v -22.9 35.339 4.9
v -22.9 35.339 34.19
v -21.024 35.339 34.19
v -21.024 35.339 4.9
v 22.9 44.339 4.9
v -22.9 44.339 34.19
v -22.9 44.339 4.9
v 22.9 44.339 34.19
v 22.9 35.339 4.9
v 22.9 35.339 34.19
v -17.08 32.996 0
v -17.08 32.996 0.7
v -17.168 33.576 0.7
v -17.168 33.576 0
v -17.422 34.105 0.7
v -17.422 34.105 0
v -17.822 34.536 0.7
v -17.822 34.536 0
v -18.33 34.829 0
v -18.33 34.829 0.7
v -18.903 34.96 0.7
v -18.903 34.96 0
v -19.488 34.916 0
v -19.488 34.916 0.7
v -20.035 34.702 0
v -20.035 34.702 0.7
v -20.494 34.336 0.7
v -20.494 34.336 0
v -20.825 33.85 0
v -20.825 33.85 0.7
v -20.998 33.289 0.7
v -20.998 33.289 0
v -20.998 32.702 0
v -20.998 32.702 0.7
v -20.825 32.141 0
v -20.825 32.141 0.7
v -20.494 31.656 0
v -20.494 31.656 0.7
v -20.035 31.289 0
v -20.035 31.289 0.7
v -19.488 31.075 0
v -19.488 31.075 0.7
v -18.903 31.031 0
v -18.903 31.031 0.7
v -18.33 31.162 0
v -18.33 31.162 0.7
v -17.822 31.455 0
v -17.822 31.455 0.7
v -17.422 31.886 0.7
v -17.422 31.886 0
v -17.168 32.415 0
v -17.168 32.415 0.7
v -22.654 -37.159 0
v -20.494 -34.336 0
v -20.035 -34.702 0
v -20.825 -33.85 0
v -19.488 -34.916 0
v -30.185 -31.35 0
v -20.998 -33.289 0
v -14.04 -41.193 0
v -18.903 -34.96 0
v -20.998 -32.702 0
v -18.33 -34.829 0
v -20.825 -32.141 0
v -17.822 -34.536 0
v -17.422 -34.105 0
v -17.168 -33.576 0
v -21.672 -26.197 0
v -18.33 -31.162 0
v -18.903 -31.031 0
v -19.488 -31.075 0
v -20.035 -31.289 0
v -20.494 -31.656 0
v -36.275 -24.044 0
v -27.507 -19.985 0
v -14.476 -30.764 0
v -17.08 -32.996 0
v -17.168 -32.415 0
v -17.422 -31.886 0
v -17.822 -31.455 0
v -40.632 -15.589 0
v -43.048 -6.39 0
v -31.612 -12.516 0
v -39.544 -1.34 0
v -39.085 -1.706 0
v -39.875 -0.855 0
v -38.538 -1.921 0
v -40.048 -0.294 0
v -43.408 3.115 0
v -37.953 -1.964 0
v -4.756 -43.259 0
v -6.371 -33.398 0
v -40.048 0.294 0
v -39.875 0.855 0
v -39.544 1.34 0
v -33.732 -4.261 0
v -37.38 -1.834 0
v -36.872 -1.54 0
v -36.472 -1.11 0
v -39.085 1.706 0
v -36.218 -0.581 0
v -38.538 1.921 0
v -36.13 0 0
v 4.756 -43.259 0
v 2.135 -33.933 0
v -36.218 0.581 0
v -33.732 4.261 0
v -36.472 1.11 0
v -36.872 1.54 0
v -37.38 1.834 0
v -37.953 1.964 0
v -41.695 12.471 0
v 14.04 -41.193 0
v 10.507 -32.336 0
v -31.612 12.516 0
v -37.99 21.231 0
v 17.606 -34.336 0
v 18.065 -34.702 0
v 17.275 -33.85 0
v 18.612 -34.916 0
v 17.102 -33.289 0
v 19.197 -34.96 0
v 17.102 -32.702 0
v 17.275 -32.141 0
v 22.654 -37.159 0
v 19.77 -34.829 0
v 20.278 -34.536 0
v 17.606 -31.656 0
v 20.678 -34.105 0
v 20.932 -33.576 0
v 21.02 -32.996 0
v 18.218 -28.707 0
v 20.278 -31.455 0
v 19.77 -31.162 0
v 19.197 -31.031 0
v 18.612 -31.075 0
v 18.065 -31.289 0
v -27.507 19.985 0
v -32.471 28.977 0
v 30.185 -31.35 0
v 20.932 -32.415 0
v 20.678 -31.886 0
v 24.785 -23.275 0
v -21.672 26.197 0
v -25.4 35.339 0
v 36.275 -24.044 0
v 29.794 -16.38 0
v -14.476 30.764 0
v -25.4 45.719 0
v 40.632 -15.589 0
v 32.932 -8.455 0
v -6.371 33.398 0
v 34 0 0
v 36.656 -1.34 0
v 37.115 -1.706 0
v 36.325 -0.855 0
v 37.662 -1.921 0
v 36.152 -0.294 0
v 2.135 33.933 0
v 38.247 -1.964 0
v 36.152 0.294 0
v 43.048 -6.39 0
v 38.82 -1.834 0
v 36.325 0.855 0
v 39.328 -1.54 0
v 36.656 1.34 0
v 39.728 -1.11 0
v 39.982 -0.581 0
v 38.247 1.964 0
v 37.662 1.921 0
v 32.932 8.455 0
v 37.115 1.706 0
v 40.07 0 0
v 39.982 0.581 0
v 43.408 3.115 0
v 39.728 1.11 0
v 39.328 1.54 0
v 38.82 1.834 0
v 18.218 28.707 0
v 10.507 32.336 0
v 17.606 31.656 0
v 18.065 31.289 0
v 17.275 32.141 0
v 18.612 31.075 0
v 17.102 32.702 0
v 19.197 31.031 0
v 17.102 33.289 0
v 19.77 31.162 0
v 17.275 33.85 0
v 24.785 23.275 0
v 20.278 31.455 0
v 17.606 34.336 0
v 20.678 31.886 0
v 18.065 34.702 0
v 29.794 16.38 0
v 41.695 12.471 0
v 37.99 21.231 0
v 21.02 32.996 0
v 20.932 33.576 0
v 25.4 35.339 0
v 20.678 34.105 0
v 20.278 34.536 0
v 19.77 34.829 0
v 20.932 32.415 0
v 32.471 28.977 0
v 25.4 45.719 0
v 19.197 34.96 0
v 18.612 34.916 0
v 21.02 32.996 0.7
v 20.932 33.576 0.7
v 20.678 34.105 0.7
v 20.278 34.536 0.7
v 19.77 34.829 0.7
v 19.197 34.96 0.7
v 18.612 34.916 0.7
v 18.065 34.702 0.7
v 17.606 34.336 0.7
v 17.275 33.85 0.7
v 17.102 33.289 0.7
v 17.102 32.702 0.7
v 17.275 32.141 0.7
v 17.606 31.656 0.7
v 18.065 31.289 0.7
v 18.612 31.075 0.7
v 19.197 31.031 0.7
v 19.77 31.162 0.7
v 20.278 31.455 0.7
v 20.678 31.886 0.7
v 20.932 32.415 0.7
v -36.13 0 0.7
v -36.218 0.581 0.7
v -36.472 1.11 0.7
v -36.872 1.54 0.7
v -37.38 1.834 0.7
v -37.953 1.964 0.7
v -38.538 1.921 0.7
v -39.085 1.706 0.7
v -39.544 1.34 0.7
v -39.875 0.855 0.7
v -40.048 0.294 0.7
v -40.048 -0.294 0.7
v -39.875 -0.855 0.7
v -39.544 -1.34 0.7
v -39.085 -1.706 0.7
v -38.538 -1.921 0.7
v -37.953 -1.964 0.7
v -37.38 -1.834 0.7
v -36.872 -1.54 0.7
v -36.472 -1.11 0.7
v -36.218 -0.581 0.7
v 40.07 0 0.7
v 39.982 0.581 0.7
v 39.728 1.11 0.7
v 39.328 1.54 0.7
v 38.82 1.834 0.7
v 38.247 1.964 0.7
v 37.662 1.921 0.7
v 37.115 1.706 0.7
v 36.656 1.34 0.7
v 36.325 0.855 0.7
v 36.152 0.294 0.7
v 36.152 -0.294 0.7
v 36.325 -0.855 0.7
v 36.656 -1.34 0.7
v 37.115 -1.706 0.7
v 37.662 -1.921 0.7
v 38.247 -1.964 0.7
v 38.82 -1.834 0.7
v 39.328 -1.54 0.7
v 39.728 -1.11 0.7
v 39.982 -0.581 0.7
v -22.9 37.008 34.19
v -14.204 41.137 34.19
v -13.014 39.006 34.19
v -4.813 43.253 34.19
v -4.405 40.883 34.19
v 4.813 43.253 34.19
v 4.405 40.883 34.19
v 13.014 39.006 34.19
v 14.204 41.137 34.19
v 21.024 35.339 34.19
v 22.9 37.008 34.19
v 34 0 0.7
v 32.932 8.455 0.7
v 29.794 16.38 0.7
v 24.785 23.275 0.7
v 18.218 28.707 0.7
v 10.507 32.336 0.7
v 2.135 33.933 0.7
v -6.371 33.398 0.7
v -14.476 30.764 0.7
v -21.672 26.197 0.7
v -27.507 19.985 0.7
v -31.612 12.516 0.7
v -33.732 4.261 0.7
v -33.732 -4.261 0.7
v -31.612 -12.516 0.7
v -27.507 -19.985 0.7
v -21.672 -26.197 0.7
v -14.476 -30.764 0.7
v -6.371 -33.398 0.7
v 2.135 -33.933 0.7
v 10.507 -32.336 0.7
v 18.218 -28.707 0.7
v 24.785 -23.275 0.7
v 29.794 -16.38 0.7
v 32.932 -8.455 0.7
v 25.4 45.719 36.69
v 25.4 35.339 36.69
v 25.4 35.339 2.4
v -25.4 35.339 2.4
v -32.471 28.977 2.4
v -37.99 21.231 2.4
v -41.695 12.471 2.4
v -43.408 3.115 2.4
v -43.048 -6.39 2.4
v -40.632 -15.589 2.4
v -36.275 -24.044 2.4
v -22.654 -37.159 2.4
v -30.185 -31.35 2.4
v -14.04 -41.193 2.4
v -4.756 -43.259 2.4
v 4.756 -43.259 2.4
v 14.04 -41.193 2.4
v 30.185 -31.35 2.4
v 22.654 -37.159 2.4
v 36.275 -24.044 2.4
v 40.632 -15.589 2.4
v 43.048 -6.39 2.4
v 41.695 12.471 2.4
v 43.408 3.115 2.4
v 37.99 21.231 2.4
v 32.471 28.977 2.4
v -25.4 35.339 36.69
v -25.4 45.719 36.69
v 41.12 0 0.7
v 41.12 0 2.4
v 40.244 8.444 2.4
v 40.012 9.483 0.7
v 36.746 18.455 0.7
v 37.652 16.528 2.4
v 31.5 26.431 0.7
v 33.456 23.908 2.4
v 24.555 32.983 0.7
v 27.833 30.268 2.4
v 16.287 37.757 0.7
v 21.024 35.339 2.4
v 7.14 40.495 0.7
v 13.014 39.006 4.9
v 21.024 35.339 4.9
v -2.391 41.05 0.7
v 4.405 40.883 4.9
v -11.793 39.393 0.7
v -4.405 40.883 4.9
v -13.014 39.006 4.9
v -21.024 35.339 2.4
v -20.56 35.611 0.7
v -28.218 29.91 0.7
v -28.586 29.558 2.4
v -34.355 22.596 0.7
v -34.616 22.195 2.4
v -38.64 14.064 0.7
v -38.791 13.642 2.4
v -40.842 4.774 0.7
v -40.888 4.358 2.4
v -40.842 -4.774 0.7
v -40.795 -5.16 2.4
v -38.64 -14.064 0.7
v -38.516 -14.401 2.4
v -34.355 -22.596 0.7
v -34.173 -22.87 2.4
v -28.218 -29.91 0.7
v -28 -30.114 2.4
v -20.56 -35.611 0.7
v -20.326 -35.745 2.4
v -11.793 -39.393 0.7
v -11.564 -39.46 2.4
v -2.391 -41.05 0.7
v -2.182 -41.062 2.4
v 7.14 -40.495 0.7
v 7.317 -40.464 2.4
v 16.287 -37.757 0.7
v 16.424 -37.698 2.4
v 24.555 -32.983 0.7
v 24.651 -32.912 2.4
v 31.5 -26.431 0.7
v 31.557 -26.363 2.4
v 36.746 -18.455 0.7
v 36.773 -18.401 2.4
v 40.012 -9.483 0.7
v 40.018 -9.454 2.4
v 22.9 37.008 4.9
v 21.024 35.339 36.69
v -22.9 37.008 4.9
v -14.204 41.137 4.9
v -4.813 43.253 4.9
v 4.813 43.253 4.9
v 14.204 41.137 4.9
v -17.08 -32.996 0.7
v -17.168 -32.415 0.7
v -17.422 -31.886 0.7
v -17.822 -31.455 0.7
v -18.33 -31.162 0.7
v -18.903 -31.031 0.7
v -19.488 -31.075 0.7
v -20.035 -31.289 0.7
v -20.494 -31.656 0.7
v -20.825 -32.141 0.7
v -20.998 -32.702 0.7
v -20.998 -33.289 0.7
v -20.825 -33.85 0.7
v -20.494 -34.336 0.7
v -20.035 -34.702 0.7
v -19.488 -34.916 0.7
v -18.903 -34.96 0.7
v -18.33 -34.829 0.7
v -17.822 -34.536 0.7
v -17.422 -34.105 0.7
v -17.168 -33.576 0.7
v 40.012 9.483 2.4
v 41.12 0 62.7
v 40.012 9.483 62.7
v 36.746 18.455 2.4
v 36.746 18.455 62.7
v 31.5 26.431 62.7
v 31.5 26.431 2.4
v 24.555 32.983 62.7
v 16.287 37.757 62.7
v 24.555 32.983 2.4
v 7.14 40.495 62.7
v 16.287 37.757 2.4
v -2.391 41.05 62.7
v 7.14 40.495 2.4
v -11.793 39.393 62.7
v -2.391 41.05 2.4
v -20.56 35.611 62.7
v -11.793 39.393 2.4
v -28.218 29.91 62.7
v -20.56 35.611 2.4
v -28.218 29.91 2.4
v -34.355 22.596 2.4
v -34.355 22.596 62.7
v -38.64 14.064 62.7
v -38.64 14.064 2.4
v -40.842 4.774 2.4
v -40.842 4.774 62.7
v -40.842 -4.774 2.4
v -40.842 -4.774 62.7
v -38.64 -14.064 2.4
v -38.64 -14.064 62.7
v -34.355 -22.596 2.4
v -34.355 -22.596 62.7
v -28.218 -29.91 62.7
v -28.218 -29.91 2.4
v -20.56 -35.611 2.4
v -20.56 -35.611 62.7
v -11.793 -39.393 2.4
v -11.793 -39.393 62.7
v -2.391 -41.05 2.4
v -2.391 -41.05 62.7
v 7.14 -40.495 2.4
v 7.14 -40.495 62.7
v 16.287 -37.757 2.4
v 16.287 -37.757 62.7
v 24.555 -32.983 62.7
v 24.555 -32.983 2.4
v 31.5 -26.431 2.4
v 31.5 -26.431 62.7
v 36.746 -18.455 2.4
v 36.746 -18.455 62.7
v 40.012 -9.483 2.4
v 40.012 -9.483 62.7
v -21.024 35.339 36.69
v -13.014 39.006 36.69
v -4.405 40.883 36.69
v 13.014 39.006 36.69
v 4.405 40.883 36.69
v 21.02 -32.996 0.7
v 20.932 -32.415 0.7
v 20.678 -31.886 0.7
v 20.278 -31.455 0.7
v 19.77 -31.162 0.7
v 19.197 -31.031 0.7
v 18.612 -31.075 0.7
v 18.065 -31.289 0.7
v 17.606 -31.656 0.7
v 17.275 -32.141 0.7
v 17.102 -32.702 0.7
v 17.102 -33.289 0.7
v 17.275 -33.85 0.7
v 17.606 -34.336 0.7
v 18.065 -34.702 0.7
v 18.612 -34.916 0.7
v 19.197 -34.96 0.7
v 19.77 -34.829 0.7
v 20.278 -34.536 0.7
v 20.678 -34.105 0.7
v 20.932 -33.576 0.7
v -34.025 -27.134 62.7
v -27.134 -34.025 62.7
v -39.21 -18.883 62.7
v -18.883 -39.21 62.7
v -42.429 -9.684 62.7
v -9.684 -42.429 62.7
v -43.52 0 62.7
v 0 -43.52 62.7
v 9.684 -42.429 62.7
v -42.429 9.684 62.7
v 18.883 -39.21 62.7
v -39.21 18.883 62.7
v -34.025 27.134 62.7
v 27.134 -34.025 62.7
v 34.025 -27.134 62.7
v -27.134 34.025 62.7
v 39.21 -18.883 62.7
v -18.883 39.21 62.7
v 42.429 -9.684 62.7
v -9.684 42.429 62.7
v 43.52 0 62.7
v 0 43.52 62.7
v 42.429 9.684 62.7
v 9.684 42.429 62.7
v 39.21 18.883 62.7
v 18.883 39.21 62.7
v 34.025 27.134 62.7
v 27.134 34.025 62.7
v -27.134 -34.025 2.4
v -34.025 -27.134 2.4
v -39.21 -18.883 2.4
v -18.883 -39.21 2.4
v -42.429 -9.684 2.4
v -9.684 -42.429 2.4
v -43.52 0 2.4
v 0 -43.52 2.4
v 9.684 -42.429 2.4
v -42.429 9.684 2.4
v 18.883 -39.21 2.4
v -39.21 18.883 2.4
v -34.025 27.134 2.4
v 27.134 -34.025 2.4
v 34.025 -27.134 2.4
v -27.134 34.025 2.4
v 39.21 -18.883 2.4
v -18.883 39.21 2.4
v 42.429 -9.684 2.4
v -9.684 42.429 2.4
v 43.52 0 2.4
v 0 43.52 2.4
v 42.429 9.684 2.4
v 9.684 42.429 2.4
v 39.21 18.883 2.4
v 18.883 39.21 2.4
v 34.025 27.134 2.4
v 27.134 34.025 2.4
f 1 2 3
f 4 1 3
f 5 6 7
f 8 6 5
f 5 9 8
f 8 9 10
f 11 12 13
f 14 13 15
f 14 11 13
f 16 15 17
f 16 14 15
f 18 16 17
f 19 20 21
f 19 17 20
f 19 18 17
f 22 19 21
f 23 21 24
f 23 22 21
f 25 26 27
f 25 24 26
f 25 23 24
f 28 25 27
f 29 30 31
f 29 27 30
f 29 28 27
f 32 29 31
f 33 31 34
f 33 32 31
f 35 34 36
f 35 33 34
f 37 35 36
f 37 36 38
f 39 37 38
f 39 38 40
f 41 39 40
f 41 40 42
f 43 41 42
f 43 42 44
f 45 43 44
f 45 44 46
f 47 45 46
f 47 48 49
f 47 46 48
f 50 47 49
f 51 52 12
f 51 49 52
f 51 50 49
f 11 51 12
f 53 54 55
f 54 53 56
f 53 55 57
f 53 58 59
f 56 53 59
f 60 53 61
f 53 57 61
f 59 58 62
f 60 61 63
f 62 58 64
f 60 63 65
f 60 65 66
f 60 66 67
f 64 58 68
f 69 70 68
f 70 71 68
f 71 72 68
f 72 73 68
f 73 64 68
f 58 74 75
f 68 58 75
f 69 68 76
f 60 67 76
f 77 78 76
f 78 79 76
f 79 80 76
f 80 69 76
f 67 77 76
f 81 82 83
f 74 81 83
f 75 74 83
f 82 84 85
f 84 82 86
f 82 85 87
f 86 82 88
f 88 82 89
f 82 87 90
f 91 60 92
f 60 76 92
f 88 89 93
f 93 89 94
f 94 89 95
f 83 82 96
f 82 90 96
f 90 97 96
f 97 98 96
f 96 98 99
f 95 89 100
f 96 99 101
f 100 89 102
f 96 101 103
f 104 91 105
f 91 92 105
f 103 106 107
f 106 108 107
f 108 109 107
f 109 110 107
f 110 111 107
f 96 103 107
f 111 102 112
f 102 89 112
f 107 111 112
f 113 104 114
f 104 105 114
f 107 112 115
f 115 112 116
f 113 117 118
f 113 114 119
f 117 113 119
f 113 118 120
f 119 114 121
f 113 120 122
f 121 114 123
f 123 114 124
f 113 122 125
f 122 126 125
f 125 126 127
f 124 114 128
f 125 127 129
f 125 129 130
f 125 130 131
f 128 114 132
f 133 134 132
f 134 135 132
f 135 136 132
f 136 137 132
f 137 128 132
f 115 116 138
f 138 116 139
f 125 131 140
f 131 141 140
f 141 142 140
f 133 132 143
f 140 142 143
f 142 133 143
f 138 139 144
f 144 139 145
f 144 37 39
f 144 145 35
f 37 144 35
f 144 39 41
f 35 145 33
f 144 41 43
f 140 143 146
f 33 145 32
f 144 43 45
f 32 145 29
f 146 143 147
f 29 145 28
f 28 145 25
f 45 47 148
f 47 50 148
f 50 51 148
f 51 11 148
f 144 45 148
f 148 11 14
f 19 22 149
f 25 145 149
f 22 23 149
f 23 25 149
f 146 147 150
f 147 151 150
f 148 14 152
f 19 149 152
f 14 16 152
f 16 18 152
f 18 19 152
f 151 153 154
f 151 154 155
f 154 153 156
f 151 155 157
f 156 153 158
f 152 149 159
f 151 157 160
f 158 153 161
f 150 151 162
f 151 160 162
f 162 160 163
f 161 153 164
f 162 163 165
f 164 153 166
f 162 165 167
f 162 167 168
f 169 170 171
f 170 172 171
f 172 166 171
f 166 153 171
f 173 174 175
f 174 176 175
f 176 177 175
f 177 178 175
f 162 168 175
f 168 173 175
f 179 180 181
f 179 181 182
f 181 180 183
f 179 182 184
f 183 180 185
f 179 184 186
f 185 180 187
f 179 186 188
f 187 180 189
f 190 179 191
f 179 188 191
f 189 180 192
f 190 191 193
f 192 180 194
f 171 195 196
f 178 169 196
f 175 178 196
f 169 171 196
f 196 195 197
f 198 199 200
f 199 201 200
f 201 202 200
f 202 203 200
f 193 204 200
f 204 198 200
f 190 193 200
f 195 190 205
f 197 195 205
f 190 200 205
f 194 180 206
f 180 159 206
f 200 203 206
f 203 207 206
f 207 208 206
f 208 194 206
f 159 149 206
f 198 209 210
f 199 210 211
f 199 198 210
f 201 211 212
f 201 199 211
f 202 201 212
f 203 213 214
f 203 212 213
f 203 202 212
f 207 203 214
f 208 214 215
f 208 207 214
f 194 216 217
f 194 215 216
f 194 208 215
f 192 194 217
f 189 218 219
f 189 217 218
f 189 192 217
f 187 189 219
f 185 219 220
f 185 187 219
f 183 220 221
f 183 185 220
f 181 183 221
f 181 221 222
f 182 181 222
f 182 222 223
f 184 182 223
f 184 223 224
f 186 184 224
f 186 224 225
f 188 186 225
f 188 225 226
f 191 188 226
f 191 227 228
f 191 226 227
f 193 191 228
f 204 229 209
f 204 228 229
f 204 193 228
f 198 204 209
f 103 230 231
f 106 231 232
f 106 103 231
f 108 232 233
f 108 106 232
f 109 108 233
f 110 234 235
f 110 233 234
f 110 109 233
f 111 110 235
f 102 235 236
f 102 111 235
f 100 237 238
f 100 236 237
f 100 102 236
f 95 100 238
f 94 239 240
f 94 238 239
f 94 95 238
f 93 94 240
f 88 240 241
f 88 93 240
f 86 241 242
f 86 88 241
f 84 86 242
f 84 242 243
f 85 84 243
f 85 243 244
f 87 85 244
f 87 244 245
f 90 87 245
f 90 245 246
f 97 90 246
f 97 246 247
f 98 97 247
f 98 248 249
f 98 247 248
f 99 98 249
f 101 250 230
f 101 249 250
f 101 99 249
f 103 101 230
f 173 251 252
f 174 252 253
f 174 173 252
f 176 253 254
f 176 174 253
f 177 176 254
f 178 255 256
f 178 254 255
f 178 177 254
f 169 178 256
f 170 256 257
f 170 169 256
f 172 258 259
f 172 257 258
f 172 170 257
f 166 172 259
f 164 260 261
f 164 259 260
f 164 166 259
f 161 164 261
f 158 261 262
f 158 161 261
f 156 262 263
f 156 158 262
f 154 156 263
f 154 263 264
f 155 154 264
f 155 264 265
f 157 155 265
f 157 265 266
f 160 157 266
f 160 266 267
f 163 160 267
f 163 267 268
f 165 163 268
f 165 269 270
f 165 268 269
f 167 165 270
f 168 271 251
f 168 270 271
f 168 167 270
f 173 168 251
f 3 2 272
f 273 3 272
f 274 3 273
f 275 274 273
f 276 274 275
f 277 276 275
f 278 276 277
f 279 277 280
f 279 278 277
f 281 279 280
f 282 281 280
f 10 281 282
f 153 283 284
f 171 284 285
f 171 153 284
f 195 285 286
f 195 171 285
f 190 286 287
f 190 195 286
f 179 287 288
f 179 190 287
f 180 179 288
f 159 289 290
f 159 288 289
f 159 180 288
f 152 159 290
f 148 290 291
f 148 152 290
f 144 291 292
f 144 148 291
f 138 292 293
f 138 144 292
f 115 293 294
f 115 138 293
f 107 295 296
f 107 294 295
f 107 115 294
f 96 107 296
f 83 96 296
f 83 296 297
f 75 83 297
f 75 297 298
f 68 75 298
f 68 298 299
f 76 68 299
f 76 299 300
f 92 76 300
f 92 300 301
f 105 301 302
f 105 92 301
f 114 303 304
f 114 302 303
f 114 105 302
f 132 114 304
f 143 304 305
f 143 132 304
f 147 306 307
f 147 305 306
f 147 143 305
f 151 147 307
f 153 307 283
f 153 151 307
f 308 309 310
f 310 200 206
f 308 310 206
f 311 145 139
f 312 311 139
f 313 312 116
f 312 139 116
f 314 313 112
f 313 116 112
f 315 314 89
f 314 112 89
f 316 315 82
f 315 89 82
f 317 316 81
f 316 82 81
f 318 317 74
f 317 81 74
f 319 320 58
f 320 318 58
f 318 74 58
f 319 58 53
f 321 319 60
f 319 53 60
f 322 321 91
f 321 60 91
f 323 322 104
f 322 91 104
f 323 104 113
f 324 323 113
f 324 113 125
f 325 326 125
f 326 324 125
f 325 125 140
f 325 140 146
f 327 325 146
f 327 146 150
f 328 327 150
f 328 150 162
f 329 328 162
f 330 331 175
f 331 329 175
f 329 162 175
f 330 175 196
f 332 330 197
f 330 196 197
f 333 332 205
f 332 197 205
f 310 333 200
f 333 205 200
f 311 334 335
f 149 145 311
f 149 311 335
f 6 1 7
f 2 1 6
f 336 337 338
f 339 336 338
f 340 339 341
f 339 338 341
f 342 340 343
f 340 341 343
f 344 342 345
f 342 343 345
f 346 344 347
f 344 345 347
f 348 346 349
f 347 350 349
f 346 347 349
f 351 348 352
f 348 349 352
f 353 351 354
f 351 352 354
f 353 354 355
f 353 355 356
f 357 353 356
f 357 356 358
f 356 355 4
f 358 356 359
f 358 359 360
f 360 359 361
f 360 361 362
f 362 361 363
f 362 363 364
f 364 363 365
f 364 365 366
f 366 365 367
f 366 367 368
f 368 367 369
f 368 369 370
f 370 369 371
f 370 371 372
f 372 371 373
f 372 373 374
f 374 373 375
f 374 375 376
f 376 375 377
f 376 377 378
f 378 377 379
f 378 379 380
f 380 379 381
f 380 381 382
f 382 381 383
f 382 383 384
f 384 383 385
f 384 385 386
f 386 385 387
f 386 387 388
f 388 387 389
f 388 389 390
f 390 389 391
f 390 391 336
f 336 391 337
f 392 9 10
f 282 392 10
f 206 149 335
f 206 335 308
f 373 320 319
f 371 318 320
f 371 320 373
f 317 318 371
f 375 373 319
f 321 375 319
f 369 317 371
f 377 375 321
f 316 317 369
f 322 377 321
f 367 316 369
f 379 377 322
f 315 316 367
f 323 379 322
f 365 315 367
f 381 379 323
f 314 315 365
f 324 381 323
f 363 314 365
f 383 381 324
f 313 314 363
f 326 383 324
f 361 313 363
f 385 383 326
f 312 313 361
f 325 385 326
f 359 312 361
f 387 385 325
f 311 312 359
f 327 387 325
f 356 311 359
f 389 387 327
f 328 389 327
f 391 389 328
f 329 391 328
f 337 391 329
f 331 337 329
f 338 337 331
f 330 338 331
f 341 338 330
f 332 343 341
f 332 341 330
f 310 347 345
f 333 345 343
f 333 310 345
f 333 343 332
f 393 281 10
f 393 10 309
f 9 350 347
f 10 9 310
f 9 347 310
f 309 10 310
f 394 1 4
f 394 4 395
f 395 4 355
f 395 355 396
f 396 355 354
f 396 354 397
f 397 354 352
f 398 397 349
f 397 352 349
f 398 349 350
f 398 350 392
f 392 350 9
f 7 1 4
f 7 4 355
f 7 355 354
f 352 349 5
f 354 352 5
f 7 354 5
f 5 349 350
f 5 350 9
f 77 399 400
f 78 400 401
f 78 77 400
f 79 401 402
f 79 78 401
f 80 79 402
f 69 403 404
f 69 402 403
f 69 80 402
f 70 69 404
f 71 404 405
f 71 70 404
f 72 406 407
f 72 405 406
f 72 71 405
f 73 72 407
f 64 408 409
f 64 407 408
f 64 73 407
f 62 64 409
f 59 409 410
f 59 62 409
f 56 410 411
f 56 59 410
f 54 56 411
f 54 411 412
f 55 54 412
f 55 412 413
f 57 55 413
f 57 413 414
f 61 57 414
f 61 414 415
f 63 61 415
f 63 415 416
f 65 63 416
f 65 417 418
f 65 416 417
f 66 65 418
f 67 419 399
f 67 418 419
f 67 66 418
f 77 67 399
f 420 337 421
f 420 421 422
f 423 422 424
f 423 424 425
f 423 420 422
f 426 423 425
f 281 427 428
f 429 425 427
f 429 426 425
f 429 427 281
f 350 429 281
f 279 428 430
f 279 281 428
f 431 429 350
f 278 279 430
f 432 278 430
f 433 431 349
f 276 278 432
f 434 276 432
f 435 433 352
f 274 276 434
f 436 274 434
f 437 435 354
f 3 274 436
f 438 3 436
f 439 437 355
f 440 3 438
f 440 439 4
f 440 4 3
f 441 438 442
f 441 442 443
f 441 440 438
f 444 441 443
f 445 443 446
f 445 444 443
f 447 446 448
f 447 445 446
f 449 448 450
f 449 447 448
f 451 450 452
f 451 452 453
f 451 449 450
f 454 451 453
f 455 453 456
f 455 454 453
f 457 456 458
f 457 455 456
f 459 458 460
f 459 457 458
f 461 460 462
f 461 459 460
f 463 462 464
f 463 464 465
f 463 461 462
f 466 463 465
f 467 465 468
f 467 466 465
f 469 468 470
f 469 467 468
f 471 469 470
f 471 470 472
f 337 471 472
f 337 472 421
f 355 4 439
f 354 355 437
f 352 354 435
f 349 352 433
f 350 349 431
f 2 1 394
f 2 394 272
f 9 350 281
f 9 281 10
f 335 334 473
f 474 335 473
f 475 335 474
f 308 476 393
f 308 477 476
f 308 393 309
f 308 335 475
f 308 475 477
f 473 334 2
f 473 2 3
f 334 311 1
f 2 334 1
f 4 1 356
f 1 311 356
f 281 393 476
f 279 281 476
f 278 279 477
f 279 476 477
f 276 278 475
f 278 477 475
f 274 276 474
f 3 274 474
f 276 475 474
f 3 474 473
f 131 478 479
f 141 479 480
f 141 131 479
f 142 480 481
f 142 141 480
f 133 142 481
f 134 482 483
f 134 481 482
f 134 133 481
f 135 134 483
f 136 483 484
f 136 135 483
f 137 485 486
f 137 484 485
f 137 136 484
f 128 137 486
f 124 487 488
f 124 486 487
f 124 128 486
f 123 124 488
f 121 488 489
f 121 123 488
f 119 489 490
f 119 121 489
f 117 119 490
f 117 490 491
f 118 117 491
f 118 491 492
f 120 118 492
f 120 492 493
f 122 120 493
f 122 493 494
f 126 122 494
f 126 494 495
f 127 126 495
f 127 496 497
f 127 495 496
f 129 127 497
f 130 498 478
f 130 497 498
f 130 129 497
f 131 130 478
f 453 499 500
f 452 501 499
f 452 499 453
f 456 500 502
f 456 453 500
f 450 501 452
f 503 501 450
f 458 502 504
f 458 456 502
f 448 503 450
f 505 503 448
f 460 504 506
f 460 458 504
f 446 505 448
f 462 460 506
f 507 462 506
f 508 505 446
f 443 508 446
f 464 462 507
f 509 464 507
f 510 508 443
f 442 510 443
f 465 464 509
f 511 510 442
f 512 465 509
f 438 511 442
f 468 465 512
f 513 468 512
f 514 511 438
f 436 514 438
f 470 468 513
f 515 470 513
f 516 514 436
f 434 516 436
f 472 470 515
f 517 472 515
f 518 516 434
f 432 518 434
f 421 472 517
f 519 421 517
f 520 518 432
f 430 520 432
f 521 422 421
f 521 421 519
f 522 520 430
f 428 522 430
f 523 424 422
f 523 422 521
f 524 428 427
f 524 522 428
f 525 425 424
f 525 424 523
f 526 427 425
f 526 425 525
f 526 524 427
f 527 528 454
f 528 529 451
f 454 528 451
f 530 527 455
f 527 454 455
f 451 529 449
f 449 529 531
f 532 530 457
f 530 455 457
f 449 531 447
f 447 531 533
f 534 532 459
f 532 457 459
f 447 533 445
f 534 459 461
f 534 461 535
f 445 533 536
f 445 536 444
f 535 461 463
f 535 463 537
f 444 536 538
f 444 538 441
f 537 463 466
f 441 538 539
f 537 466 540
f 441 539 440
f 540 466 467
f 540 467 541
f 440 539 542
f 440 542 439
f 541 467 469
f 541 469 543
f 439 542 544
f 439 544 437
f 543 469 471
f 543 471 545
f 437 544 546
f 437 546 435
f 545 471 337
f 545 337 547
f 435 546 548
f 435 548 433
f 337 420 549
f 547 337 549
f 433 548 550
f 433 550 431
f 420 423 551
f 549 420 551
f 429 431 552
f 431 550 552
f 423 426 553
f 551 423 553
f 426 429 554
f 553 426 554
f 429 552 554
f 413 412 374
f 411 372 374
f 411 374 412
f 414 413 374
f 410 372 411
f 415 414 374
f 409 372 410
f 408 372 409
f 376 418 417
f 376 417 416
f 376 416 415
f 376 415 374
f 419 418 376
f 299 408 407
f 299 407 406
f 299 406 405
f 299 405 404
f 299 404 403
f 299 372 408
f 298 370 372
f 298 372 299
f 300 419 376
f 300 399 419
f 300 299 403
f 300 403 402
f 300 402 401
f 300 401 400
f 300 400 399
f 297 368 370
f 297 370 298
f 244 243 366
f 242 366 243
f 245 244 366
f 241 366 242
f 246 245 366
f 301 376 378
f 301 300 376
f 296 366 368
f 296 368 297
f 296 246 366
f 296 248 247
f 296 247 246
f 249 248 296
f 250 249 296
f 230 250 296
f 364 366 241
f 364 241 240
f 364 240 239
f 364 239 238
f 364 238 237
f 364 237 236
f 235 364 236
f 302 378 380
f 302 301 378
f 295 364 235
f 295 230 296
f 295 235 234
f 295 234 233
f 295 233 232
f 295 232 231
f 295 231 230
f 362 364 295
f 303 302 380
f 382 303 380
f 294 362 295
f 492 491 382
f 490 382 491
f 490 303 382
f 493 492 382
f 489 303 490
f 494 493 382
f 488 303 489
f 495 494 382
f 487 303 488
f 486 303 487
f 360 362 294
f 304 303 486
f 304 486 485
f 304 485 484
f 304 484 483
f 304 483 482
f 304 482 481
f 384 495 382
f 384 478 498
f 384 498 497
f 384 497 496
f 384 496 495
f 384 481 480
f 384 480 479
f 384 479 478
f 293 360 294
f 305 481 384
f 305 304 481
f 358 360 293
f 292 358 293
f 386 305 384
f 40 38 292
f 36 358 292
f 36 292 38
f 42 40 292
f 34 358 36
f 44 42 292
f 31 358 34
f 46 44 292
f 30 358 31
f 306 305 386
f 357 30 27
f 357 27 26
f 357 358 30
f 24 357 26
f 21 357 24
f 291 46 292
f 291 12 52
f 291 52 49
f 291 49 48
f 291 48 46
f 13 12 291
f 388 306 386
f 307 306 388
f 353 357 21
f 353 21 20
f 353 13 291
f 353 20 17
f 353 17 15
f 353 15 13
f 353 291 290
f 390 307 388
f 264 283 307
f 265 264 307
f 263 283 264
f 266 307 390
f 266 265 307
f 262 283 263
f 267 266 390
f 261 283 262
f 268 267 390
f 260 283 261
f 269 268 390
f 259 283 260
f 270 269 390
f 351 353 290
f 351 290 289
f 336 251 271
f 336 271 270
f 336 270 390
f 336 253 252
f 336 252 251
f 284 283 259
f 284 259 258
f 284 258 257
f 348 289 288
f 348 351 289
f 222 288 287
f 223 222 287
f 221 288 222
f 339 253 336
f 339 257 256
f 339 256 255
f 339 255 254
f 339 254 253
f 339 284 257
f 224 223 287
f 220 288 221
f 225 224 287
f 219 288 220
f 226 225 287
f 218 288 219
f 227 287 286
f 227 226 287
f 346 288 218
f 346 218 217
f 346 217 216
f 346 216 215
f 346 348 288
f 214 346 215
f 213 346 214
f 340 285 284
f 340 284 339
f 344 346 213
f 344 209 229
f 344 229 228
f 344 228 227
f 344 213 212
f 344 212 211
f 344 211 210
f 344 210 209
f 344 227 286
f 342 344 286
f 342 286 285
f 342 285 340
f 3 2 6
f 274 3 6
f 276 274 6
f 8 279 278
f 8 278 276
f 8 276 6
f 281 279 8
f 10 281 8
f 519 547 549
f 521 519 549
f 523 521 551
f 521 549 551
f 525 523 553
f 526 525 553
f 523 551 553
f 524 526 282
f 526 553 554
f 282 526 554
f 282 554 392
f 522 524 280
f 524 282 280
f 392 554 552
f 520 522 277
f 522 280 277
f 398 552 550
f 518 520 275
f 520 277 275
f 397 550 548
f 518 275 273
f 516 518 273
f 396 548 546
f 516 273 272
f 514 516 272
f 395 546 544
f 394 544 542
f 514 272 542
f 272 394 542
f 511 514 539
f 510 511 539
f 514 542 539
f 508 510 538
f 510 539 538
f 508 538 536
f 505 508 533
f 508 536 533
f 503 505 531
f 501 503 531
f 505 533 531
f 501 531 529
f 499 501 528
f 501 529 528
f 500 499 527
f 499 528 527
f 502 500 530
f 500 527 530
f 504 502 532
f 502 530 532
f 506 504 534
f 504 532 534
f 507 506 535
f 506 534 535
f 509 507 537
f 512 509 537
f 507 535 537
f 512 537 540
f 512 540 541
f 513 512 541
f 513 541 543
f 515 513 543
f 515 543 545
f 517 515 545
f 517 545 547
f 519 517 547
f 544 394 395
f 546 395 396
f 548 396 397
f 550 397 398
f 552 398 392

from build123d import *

# Parameters (mm, degrees)
ESQUISSE1_R             = 43.52
ESQUISSE1_R_2           = 1.97
ESQUISSE1_R_3           = 34
BOSS_EXTRU_1_DEPTH      = 2.4
ESQUISSE2_R             = 43.52
ESQUISSE2_R_2           = 41.12
BOSS_EXTRU_2_DEPTH      = 60.3
ESQUISSE3_W             = 50.8
ESQUISSE3_H             = 10.38
BOSS_EXTRU_3_DEPTH      = 34.29
ESQUISSE5_W             = 45.8
ESQUISSE5_H             = 29.29
ENL_V_MAT_EXTRU_2_DEPTH = 9
ESQUISSE6_R             = 41.12
ENL_V_MAT_EXTRU_3_DEPTH = 62


with BuildPart() as part:
    # Esquisse1 → Boss.-Extru.1 (new body)
    # profile 1 of 2: a face of its own
    with BuildSketch(Plane.XY):
        Circle(ESQUISSE1_R)
        with Locations((-38.1, 0)):
            Circle(ESQUISSE1_R_2, mode=Mode.SUBTRACT)
        with Locations((-19.05, -32.995567884)):
            Circle(ESQUISSE1_R_2, mode=Mode.SUBTRACT)
        with Locations((19.05, -32.995567884)):
            Circle(ESQUISSE1_R_2, mode=Mode.SUBTRACT)
        with Locations((38.1, 0)):
            Circle(ESQUISSE1_R_2, mode=Mode.SUBTRACT)
        with Locations((19.05, 32.995567884)):
            Circle(ESQUISSE1_R_2, mode=Mode.SUBTRACT)
        with Locations((-19.05, 32.995567884)):
            Circle(ESQUISSE1_R_2, mode=Mode.SUBTRACT)
        Circle(ESQUISSE1_R_3, mode=Mode.SUBTRACT)
    # profile 2 of 2: a face of its own
    with BuildSketch(Plane.XY):
        with BuildLine():
            ThreePointArc((-25.4, 35.338794547), (0, 43.52), (25.4, 35.338794547))
            Line((25.4, 35.338794547), (25.4, 45.718794547))
            Line((25.4, 45.718794547), (-25.4, 45.718794547))
            Line((-25.4, 45.718794547), (-25.4, 35.338794547))
        make_face()
    extrude(amount=BOSS_EXTRU_1_DEPTH)

    # Esquisse3 → Boss.-Extru.3 (add)
    with BuildSketch(Plane.XY.offset(2.4)):
        with Locations((0, 40.528794547)):
            Rectangle(ESQUISSE3_W, ESQUISSE3_H)
    extrude(amount=BOSS_EXTRU_3_DEPTH)


with BuildPart() as body_2:
    # Esquisse2 → Boss.-Extru.2 (new body)
    with BuildSketch(Plane.XY.offset(2.4)):
        Circle(ESQUISSE2_R)
        Circle(ESQUISSE2_R_2, mode=Mode.SUBTRACT)
    extrude(amount=BOSS_EXTRU_2_DEPTH)


with BuildPart() as enl_v_mat_extru_2_tool:
    # Esquisse5 → Enlèv. mat.-Extru.2 (new body)
    with BuildSketch(Plane.XZ.offset(-35.338794547)):
        with Locations((0, 19.545)):
            Rectangle(ESQUISSE5_W, ESQUISSE5_H)
    extrude(amount=-ENL_V_MAT_EXTRU_2_DEPTH)


with BuildPart() as part_1:
    add(part.part)

    # Enlèv. mat.-Extru.2: cut by enl_v_mat_extru_2_tool
    add(enl_v_mat_extru_2_tool.part, mode=Mode.SUBTRACT)

    # Esquisse6 → Enlèv. mat.-Extru.3 (cut)
    with BuildSketch(Plane.XY.offset(62.7)):
        Circle(ESQUISSE6_R)
    extrude(amount=-ENL_V_MAT_EXTRU_3_DEPTH, mode=Mode.SUBTRACT)


with BuildPart() as body_2_1:
    add(body_2.part)

    # Enlèv. mat.-Extru.2: cut by enl_v_mat_extru_2_tool
    add(enl_v_mat_extru_2_tool.part, mode=Mode.SUBTRACT)


solid = Compound([part_1.part, body_2_1.part])
